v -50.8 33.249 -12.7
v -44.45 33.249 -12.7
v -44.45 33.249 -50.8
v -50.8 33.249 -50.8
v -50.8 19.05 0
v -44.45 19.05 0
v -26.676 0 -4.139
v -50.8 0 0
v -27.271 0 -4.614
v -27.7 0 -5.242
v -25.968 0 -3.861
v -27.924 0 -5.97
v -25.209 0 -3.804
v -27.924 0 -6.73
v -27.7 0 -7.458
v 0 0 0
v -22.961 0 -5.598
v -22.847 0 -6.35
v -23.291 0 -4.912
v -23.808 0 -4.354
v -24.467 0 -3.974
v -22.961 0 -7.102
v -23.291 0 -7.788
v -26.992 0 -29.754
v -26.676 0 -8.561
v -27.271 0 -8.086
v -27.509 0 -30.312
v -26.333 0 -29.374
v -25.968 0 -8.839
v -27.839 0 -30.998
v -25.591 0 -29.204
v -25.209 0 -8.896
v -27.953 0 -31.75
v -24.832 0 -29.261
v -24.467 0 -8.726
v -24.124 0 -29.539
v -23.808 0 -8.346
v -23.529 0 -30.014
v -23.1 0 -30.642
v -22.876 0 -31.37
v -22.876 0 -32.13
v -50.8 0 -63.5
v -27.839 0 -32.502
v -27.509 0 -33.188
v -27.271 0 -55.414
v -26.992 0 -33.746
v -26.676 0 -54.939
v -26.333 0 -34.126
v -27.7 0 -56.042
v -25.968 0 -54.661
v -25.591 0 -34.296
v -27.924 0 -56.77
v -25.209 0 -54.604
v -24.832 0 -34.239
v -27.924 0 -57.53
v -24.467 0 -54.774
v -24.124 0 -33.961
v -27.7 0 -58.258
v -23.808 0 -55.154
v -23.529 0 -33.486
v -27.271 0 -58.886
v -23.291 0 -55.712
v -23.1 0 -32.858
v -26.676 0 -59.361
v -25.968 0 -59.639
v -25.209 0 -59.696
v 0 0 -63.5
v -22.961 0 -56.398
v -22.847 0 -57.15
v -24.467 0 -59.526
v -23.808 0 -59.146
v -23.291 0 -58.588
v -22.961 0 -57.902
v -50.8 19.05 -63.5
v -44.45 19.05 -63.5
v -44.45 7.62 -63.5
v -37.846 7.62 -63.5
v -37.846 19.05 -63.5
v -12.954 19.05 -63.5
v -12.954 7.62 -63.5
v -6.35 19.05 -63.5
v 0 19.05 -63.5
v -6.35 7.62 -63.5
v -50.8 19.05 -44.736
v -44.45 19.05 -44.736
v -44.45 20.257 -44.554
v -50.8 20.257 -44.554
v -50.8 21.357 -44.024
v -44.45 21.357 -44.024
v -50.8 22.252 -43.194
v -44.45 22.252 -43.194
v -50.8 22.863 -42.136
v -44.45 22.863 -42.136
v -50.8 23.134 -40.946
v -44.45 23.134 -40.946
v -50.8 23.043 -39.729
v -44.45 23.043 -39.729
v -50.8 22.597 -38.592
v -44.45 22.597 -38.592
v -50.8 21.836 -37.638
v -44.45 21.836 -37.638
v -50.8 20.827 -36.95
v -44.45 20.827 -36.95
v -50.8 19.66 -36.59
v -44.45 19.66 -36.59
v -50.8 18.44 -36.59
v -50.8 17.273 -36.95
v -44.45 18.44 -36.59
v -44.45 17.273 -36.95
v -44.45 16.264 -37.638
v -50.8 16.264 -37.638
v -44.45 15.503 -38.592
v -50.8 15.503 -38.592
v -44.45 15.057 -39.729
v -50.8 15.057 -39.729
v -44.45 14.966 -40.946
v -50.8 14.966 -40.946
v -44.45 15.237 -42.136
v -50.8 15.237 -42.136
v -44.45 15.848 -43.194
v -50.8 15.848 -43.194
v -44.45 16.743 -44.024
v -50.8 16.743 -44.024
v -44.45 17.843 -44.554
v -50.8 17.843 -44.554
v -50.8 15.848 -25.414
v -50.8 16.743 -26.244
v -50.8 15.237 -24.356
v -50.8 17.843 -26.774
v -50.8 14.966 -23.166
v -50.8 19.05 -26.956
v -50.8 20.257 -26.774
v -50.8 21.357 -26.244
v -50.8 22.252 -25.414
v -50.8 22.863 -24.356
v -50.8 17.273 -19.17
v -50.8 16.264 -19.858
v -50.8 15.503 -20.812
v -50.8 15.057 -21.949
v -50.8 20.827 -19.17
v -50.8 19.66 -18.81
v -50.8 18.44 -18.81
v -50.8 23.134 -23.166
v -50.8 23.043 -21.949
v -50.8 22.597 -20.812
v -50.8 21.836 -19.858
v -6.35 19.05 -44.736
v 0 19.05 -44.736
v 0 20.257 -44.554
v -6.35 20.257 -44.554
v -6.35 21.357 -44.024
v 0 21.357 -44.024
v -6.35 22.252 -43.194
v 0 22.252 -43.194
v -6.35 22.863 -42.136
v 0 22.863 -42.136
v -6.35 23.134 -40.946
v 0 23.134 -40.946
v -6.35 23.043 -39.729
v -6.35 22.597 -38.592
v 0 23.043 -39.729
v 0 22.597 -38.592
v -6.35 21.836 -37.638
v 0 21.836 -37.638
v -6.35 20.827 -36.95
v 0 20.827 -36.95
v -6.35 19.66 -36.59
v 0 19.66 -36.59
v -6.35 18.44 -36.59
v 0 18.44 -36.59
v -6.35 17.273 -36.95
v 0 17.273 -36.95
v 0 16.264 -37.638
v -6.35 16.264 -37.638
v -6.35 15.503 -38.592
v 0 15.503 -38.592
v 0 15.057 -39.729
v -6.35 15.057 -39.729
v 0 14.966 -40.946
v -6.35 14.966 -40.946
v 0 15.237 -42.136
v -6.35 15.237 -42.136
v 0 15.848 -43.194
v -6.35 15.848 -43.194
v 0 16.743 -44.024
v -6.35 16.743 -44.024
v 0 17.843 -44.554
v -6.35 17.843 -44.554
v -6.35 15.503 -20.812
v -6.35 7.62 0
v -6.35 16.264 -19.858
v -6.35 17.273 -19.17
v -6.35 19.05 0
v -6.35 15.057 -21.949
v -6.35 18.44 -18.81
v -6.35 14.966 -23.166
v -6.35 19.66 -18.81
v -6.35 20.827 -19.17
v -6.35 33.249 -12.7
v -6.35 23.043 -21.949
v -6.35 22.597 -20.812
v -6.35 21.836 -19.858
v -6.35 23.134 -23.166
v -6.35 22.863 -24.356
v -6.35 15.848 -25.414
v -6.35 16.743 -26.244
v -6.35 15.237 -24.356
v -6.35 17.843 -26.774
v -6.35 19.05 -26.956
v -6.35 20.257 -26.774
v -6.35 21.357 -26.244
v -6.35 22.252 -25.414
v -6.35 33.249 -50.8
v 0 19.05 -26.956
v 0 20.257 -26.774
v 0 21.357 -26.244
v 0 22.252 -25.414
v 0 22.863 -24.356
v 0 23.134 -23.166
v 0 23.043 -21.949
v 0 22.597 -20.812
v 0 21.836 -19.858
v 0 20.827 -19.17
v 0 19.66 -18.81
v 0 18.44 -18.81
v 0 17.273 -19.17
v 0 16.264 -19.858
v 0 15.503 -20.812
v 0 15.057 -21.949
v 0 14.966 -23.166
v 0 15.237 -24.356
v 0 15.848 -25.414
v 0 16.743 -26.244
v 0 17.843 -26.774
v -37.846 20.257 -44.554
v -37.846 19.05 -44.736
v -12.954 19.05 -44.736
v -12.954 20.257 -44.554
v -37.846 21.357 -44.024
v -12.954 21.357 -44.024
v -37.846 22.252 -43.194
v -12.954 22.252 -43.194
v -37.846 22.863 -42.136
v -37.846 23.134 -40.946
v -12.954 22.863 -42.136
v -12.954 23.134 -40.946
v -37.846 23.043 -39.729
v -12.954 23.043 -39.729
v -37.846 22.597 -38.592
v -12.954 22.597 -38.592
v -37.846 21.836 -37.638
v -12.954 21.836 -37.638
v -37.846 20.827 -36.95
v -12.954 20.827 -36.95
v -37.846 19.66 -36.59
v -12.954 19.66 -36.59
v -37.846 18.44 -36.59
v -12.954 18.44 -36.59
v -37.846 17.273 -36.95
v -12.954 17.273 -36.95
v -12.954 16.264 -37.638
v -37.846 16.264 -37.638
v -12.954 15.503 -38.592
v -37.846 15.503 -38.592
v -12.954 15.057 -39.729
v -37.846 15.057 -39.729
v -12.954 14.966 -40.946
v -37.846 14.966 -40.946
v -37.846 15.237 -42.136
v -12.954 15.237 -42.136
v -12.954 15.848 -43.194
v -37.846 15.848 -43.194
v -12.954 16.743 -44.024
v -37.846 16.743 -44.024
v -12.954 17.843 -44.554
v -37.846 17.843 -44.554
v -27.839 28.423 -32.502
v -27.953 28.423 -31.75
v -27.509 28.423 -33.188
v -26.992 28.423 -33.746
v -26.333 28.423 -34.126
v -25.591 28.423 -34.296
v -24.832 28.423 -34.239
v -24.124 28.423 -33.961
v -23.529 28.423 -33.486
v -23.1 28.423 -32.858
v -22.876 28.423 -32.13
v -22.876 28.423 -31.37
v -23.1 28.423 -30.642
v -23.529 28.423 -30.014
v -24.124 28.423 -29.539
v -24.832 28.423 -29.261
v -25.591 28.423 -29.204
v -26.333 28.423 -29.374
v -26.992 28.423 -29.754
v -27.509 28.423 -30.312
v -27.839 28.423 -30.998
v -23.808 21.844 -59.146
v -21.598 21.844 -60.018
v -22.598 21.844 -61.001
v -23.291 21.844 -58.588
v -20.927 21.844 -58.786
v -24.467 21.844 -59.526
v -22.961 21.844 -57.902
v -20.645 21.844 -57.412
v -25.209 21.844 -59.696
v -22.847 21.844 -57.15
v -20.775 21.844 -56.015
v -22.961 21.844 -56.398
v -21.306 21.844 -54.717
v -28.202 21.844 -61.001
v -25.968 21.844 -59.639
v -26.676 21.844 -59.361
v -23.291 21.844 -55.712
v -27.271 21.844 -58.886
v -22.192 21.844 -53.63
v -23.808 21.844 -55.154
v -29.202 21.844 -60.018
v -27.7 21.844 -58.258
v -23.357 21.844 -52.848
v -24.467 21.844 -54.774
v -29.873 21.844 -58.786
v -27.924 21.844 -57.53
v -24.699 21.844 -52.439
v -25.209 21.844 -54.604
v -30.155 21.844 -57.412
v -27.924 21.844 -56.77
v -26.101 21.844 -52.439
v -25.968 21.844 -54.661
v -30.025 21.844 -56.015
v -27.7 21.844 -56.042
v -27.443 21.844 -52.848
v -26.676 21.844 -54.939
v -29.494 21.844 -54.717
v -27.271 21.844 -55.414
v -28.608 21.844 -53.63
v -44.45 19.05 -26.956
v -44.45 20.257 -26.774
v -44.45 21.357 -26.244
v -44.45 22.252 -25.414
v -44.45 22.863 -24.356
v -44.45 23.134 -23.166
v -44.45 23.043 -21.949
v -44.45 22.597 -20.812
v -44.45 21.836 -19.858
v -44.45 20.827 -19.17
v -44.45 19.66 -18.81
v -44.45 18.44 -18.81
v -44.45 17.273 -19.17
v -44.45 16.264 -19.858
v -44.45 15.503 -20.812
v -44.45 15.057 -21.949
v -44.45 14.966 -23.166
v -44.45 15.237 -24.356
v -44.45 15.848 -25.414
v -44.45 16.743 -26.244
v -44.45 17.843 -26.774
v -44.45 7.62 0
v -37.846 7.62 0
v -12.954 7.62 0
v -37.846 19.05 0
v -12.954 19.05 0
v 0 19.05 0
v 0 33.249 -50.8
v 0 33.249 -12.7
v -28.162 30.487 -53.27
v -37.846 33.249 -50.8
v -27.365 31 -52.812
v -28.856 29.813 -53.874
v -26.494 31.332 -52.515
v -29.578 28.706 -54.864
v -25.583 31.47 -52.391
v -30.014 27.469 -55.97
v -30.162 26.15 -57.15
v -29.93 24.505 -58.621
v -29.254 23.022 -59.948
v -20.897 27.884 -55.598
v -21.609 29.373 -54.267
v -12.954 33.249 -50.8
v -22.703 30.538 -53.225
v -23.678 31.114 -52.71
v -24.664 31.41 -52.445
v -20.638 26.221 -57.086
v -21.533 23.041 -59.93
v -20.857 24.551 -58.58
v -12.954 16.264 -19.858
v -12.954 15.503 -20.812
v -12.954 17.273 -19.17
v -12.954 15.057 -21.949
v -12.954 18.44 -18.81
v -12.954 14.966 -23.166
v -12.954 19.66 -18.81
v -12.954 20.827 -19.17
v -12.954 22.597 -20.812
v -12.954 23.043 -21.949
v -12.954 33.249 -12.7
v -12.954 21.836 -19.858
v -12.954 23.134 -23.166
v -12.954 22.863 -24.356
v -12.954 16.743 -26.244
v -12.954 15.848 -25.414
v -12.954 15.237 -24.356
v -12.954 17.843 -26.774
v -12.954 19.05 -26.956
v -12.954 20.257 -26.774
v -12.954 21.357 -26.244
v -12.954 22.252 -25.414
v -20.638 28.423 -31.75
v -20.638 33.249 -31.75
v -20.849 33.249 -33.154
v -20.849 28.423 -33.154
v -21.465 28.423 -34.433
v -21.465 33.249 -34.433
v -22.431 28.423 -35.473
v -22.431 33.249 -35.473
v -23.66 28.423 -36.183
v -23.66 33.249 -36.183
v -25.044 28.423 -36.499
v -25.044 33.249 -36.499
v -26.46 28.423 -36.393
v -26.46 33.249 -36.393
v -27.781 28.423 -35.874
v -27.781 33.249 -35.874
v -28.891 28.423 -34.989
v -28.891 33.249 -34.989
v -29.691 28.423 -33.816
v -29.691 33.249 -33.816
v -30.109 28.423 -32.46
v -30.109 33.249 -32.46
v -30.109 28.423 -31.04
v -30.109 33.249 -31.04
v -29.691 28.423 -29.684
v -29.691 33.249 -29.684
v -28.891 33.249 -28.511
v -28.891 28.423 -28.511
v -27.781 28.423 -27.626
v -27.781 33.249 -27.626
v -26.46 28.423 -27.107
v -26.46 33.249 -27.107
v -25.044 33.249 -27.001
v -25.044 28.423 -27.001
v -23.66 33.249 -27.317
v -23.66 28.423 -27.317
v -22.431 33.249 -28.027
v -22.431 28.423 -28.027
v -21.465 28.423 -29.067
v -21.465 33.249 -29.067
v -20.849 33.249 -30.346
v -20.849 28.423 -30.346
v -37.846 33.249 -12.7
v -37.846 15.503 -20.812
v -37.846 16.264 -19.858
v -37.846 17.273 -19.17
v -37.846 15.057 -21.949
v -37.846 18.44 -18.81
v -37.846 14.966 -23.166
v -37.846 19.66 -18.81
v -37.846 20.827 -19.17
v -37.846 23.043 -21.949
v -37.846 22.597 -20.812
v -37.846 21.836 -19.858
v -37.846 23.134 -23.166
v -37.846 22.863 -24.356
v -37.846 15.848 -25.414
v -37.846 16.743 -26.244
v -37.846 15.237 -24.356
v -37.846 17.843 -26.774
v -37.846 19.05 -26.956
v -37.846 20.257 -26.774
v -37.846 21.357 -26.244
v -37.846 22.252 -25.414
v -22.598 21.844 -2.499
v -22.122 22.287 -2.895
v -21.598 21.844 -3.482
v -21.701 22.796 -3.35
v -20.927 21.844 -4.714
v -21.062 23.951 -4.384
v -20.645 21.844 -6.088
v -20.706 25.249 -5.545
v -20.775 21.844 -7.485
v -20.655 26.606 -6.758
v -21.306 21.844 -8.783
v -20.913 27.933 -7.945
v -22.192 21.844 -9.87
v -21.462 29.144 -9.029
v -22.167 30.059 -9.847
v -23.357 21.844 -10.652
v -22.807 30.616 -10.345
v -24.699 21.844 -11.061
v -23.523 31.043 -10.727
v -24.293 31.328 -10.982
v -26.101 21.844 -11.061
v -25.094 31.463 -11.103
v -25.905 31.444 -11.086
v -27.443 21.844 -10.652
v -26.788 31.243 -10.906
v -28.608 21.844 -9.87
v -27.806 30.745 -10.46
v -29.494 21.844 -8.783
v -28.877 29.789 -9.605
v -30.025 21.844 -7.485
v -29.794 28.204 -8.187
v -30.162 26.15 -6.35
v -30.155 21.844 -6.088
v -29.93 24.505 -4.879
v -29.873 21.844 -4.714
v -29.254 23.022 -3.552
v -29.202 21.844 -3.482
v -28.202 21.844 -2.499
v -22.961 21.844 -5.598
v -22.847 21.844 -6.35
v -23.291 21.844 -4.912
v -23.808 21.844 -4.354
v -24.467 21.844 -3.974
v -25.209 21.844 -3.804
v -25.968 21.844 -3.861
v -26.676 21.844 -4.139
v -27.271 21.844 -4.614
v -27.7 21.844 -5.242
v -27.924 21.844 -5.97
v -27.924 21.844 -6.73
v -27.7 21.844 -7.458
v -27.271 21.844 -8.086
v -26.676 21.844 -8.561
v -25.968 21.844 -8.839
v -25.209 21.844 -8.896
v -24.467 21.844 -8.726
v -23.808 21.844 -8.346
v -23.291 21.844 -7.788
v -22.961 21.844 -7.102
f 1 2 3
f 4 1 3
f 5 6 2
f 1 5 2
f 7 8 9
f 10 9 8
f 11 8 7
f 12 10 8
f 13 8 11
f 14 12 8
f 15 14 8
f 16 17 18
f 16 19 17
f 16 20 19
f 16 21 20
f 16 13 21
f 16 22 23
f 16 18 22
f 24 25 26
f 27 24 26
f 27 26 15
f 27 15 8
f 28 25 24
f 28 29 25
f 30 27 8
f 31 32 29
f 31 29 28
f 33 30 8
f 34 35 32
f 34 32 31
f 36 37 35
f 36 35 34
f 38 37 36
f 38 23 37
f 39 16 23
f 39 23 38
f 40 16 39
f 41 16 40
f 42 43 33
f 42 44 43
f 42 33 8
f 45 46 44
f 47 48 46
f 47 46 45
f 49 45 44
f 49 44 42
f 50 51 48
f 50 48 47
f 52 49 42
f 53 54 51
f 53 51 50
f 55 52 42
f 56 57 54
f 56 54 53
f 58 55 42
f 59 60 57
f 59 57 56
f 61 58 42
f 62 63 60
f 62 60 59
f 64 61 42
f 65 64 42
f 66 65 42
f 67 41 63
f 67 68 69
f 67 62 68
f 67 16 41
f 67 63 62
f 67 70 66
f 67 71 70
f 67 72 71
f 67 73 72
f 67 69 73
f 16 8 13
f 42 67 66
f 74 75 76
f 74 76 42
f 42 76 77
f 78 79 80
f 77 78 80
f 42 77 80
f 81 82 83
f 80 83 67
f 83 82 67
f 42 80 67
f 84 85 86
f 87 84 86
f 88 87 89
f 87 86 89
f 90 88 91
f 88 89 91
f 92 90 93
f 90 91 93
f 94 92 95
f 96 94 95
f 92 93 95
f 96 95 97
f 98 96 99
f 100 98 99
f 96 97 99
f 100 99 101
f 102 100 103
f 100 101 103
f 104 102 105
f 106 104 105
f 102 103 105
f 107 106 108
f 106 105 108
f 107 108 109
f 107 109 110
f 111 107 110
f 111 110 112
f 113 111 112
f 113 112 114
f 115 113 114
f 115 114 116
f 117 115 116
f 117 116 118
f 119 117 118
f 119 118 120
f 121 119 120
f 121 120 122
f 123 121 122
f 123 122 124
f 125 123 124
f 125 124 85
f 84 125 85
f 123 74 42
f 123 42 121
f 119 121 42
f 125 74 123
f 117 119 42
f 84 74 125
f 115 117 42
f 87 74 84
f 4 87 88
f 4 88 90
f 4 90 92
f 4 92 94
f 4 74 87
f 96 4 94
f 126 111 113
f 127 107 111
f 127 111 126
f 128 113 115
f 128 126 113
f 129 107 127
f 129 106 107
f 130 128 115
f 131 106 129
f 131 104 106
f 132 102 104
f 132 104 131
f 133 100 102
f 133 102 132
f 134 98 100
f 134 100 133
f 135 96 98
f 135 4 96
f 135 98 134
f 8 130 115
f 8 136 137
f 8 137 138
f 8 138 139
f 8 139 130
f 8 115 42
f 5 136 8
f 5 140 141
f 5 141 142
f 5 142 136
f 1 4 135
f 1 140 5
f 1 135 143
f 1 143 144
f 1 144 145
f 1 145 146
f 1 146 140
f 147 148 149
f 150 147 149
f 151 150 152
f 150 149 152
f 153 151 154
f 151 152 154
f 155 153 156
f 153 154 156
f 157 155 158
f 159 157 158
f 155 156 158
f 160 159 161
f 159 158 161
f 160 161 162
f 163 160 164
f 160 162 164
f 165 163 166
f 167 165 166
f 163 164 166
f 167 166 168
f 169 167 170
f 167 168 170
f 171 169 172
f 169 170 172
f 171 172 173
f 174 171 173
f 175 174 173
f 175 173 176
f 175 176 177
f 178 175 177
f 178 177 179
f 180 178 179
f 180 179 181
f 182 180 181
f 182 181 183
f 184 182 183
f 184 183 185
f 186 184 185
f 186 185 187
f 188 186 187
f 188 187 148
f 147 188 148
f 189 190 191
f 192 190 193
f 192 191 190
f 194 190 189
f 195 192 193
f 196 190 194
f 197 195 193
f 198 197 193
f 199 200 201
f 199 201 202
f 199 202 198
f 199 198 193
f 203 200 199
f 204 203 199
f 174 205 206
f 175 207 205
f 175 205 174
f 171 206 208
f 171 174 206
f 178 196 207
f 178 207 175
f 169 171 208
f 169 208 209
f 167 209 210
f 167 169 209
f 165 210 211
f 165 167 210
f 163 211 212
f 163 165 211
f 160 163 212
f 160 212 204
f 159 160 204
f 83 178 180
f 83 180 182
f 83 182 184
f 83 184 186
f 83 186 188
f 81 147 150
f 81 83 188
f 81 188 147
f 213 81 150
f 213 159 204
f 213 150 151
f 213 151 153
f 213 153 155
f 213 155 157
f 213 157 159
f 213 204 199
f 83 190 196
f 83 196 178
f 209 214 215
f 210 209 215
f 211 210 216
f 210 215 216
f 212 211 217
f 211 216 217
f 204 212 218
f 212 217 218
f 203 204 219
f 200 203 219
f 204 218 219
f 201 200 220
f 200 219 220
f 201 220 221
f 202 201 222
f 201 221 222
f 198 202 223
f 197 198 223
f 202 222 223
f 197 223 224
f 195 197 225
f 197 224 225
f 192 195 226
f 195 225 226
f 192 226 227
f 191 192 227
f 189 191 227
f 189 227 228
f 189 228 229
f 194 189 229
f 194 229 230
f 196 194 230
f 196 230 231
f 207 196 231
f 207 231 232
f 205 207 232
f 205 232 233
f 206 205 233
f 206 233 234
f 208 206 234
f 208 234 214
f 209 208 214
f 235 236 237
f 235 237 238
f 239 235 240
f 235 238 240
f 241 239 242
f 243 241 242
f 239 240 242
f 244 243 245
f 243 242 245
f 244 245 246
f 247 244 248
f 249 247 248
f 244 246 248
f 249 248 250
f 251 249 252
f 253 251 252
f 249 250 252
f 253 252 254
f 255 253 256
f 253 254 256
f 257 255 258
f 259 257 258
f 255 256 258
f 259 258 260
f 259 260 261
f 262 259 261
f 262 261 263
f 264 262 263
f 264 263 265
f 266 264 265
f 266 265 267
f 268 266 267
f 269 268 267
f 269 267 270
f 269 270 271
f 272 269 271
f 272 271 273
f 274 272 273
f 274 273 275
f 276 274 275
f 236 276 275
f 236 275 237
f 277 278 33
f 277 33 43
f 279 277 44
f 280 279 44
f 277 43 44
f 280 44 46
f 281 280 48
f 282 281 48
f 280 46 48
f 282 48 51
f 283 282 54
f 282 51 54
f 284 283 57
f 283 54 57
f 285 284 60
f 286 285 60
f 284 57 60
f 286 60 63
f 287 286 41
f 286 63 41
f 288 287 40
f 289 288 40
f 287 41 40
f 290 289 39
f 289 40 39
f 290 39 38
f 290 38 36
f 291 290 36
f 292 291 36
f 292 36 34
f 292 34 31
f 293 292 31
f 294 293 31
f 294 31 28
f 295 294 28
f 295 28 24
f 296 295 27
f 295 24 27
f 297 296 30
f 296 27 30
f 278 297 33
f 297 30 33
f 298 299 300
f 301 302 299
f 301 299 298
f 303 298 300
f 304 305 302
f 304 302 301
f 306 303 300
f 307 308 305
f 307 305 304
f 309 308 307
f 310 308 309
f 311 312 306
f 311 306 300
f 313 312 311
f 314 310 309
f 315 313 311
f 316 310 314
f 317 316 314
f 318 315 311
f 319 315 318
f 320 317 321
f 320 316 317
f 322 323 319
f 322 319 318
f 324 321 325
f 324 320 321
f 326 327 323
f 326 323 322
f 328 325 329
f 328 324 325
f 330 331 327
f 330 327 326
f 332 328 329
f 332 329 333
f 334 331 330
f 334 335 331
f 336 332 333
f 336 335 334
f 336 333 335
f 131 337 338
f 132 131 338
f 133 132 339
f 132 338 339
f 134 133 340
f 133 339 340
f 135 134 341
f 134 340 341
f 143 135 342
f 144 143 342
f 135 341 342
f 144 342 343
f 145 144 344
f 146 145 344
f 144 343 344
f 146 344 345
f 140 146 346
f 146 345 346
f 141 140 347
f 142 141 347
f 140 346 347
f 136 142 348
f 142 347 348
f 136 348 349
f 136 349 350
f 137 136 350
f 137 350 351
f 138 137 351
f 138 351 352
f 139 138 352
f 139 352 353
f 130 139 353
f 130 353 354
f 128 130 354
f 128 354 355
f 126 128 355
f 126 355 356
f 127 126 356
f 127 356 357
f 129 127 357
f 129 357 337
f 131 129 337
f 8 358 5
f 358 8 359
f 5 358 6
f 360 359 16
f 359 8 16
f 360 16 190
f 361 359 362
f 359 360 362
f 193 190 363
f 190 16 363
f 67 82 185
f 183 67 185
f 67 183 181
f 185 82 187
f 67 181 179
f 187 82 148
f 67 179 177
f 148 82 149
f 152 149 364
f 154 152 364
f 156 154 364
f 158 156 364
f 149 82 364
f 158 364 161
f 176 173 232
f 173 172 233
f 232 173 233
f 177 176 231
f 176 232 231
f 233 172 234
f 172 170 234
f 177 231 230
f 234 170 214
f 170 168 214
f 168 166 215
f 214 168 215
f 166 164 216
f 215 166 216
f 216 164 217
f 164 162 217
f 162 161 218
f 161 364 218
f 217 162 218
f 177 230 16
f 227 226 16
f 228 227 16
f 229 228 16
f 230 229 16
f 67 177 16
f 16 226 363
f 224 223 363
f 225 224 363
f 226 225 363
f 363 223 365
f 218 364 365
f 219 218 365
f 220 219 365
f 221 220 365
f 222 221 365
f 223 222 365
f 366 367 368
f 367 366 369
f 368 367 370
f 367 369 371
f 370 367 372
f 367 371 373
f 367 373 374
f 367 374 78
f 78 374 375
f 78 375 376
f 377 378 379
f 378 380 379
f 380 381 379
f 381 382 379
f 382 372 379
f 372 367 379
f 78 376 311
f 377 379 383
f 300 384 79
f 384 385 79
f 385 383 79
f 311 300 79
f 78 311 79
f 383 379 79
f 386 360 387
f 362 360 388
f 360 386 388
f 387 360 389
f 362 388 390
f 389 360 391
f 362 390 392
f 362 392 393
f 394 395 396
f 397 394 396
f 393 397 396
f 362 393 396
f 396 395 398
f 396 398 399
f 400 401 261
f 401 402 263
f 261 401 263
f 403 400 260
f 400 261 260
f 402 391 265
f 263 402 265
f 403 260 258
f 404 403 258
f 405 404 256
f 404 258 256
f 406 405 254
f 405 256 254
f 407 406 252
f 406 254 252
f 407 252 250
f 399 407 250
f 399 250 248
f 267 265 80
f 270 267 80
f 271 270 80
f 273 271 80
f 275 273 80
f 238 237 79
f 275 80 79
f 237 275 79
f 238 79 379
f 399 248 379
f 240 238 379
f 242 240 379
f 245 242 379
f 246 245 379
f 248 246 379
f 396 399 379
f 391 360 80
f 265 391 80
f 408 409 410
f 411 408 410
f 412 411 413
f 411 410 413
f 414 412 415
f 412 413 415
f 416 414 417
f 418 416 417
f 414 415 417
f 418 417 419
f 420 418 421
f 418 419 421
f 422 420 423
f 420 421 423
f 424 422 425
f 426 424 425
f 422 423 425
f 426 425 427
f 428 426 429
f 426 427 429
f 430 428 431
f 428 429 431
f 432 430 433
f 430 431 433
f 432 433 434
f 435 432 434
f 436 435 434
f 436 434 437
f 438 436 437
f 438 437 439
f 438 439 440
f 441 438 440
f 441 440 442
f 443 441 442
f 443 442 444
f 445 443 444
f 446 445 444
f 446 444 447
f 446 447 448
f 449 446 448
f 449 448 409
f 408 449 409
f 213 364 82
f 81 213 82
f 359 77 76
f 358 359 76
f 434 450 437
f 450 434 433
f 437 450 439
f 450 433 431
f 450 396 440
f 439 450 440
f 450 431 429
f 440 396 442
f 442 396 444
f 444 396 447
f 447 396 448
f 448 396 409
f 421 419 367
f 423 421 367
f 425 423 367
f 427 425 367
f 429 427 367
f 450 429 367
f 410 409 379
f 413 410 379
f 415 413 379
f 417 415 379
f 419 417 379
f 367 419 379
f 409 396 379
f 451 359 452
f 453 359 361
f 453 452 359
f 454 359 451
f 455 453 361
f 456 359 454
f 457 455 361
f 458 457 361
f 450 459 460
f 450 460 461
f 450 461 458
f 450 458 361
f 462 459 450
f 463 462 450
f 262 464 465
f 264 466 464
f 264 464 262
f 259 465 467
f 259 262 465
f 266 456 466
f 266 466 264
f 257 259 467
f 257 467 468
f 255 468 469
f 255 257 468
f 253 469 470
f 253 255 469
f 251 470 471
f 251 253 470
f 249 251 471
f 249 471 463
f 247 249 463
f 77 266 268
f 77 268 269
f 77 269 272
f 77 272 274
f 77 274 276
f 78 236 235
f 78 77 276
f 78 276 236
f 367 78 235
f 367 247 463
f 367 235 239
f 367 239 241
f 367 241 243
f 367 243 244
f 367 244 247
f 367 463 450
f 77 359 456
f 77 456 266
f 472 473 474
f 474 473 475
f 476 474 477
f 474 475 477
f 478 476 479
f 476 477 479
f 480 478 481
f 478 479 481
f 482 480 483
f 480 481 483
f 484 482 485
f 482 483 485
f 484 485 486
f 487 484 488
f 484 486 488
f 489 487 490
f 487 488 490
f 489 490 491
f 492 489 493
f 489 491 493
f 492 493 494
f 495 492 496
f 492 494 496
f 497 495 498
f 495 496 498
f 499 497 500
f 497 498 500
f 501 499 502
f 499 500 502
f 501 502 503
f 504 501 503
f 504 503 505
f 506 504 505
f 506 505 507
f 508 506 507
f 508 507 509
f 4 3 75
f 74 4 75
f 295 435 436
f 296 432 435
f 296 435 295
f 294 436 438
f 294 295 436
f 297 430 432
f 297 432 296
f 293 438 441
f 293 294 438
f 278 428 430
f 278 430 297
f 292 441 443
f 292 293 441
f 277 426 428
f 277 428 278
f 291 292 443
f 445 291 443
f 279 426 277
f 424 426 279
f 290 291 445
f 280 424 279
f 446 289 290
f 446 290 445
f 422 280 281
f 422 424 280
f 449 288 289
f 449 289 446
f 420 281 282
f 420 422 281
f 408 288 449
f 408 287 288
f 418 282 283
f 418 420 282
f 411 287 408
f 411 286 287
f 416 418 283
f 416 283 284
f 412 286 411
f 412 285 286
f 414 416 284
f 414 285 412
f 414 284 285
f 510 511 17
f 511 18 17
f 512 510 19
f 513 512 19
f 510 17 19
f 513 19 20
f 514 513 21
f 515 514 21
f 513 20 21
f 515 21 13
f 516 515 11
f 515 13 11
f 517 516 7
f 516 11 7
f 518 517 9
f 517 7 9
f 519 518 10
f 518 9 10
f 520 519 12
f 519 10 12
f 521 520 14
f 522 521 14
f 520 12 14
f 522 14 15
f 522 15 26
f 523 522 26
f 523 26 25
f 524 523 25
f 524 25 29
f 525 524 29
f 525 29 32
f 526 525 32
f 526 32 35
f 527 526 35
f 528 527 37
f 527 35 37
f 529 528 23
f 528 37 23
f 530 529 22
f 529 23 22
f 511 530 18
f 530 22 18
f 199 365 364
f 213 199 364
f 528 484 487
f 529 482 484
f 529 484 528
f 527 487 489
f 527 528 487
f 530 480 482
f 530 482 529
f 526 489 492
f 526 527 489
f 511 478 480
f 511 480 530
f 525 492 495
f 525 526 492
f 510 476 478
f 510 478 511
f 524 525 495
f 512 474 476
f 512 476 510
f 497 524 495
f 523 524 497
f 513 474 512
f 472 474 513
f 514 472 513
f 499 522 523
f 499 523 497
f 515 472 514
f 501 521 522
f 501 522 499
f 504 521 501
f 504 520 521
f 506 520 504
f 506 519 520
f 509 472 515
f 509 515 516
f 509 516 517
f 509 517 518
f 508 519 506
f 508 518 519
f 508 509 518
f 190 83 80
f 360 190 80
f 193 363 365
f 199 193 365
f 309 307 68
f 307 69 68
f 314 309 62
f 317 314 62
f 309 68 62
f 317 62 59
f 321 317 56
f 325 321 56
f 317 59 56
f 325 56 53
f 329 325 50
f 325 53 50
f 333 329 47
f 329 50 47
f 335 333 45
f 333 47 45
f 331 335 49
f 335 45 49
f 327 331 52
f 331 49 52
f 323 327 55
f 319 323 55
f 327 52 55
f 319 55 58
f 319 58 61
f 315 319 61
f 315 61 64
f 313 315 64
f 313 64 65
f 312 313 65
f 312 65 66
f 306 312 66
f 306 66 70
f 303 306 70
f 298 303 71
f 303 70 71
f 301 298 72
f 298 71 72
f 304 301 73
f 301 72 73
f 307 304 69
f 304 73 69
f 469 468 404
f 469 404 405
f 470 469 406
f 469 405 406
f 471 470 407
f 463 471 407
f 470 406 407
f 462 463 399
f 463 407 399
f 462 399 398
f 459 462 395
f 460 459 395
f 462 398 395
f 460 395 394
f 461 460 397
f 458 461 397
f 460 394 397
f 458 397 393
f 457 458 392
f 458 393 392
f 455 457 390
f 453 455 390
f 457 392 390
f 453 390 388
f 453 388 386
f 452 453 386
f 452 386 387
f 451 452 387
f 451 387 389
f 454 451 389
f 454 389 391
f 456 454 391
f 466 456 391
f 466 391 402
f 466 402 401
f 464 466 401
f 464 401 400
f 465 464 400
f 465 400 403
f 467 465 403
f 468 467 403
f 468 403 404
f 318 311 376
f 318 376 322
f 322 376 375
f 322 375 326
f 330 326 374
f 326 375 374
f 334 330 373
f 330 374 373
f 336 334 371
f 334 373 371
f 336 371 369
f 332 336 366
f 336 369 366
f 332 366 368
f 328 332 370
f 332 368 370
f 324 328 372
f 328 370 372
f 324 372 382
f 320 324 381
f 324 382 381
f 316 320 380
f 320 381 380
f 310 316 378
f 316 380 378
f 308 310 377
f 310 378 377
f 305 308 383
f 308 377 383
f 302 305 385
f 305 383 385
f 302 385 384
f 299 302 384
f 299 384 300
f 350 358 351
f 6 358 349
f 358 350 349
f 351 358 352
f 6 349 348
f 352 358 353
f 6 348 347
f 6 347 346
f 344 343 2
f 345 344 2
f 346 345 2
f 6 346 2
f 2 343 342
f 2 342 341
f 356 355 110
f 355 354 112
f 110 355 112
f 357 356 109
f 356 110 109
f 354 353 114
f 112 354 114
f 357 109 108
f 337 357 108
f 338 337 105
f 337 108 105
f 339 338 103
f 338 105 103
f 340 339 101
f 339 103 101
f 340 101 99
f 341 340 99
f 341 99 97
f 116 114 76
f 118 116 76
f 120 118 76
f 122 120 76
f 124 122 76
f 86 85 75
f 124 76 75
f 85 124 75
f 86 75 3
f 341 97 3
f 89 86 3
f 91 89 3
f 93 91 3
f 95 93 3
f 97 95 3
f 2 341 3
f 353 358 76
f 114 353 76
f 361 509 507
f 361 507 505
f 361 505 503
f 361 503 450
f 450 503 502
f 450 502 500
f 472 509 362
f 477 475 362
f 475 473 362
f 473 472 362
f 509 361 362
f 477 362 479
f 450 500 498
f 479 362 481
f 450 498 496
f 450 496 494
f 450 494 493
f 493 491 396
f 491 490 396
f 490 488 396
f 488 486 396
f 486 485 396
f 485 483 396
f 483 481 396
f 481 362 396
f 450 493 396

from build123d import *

# Parameters (mm, degrees)
SKETCH1_W                                       = 63.5
SKETCH1_H                                       = 6.35
BOSS_EXTRUDE1_DEPTH                             = 50.8
BOSS_EXTRUDE2_DEPTH                             = 50.8
SKETCH10_W                                      = 6.604
SKETCH10_H                                      = 25.629031657
CUT_EXTRUDE1_DEPTH                              = 88.854357354
LPATTERN3_COUNT                                 = 2
LPATTERN3_PITCH                                 = 31.496
SKETCH11_R                                      = 4.09575
CUT_EXTRUDE2_DEPTH                              = 88.854357354
CBORE_FOR_10_SOCKET_HEAD_CAP_SCREW1_D           = 5.1054
CBORE_FOR_10_SOCKET_HEAD_CAP_SCREW1_CBORE_D     = 9.525
CBORE_FOR_10_SOCKET_HEAD_CAP_SCREW1_CBORE_DEPTH = 4.826
CBORE_FOR_10_SOCKET_HEAD_CAP_SCREW3_D           = 5.1054
CBORE_FOR_10_SOCKET_HEAD_CAP_SCREW3_CBORE_D     = 9.525
CBORE_FOR_10_SOCKET_HEAD_CAP_SCREW3_CBORE_DEPTH = 11.176


with BuildPart() as part:
    # Sketch1 → Boss-Extrude1 (new body)
    with BuildSketch(Plane(origin=(0, 0, 0), x_dir=(0, 0, -1), z_dir=(1, 0, 0))):
        with Locations((31.75, 3.175)):
            Rectangle(SKETCH1_W, SKETCH1_H)
    extrude(amount=-BOSS_EXTRUDE1_DEPTH)

    # Sketch2 → Boss-Extrude2 (add)
    with BuildSketch(Plane(origin=(0, 0, 0), x_dir=(0, 0, -1), z_dir=(1, 0, 0))):
        Polygon((0, 6.35), (0, 19.05), (12.7, 33.249031657), (50.8, 33.249031657), (63.5, 19.05), (63.5, 6.35), align=None)
    extrude(amount=-BOSS_EXTRUDE2_DEPTH)

    # Sketch10 → Cut-Extrude1 (cut, through all)
    with BuildSketch(Plane(origin=(0, 0, -63.5), x_dir=(-1, 0, 0), z_dir=(0, 0, -1))):
        with Locations((9.652, 20.434515829)):
            Rectangle(SKETCH10_W, SKETCH10_H)
    cut_extrude1 = extrude(amount=-CUT_EXTRUDE1_DEPTH, mode=Mode.SUBTRACT)

    # LPattern3: Cut-Extrude1 ×2
    with Locations(*[(-i * LPATTERN3_PITCH, 0, 0) for i in range(1, LPATTERN3_COUNT)]):
        add(cut_extrude1, mode=Mode.SUBTRACT)

    # Sketch11 → Cut-Extrude2 (cut, through all)
    with BuildSketch(Plane(origin=(0, 0, 0), x_dir=(0, 0, -1), z_dir=(1, 0, 0))):
        with Locations((22.86, 19.05)):
            Circle(SKETCH11_R)
        with Locations((40.64, 19.05)):
            Circle(SKETCH11_R)
    extrude(amount=-CUT_EXTRUDE2_DEPTH, mode=Mode.SUBTRACT)

    # CBORE for #10 Socket Head Cap Screw1 (through all)
    with Locations(Plane(origin=(0, 33.249031657, 0), x_dir=(1, 0, 0), z_dir=(0, 1, 0))):
        with Locations((-25.4, 31.75)):
            CounterBoreHole(CBORE_FOR_10_SOCKET_HEAD_CAP_SCREW1_D / 2, CBORE_FOR_10_SOCKET_HEAD_CAP_SCREW1_CBORE_D / 2, CBORE_FOR_10_SOCKET_HEAD_CAP_SCREW1_CBORE_DEPTH)

    # CBORE for #10 Socket Head Cap Screw3 (through all)
    with Locations(Plane(origin=(0, 33.02, 0), x_dir=(-1, 0, 0), z_dir=(0, 1, 0))):
        with Locations((25.4, -6.35), (25.4, -57.15)):
            CounterBoreHole(CBORE_FOR_10_SOCKET_HEAD_CAP_SCREW3_D / 2, CBORE_FOR_10_SOCKET_HEAD_CAP_SCREW3_CBORE_D / 2, CBORE_FOR_10_SOCKET_HEAD_CAP_SCREW3_CBORE_DEPTH)


solid = part.part
